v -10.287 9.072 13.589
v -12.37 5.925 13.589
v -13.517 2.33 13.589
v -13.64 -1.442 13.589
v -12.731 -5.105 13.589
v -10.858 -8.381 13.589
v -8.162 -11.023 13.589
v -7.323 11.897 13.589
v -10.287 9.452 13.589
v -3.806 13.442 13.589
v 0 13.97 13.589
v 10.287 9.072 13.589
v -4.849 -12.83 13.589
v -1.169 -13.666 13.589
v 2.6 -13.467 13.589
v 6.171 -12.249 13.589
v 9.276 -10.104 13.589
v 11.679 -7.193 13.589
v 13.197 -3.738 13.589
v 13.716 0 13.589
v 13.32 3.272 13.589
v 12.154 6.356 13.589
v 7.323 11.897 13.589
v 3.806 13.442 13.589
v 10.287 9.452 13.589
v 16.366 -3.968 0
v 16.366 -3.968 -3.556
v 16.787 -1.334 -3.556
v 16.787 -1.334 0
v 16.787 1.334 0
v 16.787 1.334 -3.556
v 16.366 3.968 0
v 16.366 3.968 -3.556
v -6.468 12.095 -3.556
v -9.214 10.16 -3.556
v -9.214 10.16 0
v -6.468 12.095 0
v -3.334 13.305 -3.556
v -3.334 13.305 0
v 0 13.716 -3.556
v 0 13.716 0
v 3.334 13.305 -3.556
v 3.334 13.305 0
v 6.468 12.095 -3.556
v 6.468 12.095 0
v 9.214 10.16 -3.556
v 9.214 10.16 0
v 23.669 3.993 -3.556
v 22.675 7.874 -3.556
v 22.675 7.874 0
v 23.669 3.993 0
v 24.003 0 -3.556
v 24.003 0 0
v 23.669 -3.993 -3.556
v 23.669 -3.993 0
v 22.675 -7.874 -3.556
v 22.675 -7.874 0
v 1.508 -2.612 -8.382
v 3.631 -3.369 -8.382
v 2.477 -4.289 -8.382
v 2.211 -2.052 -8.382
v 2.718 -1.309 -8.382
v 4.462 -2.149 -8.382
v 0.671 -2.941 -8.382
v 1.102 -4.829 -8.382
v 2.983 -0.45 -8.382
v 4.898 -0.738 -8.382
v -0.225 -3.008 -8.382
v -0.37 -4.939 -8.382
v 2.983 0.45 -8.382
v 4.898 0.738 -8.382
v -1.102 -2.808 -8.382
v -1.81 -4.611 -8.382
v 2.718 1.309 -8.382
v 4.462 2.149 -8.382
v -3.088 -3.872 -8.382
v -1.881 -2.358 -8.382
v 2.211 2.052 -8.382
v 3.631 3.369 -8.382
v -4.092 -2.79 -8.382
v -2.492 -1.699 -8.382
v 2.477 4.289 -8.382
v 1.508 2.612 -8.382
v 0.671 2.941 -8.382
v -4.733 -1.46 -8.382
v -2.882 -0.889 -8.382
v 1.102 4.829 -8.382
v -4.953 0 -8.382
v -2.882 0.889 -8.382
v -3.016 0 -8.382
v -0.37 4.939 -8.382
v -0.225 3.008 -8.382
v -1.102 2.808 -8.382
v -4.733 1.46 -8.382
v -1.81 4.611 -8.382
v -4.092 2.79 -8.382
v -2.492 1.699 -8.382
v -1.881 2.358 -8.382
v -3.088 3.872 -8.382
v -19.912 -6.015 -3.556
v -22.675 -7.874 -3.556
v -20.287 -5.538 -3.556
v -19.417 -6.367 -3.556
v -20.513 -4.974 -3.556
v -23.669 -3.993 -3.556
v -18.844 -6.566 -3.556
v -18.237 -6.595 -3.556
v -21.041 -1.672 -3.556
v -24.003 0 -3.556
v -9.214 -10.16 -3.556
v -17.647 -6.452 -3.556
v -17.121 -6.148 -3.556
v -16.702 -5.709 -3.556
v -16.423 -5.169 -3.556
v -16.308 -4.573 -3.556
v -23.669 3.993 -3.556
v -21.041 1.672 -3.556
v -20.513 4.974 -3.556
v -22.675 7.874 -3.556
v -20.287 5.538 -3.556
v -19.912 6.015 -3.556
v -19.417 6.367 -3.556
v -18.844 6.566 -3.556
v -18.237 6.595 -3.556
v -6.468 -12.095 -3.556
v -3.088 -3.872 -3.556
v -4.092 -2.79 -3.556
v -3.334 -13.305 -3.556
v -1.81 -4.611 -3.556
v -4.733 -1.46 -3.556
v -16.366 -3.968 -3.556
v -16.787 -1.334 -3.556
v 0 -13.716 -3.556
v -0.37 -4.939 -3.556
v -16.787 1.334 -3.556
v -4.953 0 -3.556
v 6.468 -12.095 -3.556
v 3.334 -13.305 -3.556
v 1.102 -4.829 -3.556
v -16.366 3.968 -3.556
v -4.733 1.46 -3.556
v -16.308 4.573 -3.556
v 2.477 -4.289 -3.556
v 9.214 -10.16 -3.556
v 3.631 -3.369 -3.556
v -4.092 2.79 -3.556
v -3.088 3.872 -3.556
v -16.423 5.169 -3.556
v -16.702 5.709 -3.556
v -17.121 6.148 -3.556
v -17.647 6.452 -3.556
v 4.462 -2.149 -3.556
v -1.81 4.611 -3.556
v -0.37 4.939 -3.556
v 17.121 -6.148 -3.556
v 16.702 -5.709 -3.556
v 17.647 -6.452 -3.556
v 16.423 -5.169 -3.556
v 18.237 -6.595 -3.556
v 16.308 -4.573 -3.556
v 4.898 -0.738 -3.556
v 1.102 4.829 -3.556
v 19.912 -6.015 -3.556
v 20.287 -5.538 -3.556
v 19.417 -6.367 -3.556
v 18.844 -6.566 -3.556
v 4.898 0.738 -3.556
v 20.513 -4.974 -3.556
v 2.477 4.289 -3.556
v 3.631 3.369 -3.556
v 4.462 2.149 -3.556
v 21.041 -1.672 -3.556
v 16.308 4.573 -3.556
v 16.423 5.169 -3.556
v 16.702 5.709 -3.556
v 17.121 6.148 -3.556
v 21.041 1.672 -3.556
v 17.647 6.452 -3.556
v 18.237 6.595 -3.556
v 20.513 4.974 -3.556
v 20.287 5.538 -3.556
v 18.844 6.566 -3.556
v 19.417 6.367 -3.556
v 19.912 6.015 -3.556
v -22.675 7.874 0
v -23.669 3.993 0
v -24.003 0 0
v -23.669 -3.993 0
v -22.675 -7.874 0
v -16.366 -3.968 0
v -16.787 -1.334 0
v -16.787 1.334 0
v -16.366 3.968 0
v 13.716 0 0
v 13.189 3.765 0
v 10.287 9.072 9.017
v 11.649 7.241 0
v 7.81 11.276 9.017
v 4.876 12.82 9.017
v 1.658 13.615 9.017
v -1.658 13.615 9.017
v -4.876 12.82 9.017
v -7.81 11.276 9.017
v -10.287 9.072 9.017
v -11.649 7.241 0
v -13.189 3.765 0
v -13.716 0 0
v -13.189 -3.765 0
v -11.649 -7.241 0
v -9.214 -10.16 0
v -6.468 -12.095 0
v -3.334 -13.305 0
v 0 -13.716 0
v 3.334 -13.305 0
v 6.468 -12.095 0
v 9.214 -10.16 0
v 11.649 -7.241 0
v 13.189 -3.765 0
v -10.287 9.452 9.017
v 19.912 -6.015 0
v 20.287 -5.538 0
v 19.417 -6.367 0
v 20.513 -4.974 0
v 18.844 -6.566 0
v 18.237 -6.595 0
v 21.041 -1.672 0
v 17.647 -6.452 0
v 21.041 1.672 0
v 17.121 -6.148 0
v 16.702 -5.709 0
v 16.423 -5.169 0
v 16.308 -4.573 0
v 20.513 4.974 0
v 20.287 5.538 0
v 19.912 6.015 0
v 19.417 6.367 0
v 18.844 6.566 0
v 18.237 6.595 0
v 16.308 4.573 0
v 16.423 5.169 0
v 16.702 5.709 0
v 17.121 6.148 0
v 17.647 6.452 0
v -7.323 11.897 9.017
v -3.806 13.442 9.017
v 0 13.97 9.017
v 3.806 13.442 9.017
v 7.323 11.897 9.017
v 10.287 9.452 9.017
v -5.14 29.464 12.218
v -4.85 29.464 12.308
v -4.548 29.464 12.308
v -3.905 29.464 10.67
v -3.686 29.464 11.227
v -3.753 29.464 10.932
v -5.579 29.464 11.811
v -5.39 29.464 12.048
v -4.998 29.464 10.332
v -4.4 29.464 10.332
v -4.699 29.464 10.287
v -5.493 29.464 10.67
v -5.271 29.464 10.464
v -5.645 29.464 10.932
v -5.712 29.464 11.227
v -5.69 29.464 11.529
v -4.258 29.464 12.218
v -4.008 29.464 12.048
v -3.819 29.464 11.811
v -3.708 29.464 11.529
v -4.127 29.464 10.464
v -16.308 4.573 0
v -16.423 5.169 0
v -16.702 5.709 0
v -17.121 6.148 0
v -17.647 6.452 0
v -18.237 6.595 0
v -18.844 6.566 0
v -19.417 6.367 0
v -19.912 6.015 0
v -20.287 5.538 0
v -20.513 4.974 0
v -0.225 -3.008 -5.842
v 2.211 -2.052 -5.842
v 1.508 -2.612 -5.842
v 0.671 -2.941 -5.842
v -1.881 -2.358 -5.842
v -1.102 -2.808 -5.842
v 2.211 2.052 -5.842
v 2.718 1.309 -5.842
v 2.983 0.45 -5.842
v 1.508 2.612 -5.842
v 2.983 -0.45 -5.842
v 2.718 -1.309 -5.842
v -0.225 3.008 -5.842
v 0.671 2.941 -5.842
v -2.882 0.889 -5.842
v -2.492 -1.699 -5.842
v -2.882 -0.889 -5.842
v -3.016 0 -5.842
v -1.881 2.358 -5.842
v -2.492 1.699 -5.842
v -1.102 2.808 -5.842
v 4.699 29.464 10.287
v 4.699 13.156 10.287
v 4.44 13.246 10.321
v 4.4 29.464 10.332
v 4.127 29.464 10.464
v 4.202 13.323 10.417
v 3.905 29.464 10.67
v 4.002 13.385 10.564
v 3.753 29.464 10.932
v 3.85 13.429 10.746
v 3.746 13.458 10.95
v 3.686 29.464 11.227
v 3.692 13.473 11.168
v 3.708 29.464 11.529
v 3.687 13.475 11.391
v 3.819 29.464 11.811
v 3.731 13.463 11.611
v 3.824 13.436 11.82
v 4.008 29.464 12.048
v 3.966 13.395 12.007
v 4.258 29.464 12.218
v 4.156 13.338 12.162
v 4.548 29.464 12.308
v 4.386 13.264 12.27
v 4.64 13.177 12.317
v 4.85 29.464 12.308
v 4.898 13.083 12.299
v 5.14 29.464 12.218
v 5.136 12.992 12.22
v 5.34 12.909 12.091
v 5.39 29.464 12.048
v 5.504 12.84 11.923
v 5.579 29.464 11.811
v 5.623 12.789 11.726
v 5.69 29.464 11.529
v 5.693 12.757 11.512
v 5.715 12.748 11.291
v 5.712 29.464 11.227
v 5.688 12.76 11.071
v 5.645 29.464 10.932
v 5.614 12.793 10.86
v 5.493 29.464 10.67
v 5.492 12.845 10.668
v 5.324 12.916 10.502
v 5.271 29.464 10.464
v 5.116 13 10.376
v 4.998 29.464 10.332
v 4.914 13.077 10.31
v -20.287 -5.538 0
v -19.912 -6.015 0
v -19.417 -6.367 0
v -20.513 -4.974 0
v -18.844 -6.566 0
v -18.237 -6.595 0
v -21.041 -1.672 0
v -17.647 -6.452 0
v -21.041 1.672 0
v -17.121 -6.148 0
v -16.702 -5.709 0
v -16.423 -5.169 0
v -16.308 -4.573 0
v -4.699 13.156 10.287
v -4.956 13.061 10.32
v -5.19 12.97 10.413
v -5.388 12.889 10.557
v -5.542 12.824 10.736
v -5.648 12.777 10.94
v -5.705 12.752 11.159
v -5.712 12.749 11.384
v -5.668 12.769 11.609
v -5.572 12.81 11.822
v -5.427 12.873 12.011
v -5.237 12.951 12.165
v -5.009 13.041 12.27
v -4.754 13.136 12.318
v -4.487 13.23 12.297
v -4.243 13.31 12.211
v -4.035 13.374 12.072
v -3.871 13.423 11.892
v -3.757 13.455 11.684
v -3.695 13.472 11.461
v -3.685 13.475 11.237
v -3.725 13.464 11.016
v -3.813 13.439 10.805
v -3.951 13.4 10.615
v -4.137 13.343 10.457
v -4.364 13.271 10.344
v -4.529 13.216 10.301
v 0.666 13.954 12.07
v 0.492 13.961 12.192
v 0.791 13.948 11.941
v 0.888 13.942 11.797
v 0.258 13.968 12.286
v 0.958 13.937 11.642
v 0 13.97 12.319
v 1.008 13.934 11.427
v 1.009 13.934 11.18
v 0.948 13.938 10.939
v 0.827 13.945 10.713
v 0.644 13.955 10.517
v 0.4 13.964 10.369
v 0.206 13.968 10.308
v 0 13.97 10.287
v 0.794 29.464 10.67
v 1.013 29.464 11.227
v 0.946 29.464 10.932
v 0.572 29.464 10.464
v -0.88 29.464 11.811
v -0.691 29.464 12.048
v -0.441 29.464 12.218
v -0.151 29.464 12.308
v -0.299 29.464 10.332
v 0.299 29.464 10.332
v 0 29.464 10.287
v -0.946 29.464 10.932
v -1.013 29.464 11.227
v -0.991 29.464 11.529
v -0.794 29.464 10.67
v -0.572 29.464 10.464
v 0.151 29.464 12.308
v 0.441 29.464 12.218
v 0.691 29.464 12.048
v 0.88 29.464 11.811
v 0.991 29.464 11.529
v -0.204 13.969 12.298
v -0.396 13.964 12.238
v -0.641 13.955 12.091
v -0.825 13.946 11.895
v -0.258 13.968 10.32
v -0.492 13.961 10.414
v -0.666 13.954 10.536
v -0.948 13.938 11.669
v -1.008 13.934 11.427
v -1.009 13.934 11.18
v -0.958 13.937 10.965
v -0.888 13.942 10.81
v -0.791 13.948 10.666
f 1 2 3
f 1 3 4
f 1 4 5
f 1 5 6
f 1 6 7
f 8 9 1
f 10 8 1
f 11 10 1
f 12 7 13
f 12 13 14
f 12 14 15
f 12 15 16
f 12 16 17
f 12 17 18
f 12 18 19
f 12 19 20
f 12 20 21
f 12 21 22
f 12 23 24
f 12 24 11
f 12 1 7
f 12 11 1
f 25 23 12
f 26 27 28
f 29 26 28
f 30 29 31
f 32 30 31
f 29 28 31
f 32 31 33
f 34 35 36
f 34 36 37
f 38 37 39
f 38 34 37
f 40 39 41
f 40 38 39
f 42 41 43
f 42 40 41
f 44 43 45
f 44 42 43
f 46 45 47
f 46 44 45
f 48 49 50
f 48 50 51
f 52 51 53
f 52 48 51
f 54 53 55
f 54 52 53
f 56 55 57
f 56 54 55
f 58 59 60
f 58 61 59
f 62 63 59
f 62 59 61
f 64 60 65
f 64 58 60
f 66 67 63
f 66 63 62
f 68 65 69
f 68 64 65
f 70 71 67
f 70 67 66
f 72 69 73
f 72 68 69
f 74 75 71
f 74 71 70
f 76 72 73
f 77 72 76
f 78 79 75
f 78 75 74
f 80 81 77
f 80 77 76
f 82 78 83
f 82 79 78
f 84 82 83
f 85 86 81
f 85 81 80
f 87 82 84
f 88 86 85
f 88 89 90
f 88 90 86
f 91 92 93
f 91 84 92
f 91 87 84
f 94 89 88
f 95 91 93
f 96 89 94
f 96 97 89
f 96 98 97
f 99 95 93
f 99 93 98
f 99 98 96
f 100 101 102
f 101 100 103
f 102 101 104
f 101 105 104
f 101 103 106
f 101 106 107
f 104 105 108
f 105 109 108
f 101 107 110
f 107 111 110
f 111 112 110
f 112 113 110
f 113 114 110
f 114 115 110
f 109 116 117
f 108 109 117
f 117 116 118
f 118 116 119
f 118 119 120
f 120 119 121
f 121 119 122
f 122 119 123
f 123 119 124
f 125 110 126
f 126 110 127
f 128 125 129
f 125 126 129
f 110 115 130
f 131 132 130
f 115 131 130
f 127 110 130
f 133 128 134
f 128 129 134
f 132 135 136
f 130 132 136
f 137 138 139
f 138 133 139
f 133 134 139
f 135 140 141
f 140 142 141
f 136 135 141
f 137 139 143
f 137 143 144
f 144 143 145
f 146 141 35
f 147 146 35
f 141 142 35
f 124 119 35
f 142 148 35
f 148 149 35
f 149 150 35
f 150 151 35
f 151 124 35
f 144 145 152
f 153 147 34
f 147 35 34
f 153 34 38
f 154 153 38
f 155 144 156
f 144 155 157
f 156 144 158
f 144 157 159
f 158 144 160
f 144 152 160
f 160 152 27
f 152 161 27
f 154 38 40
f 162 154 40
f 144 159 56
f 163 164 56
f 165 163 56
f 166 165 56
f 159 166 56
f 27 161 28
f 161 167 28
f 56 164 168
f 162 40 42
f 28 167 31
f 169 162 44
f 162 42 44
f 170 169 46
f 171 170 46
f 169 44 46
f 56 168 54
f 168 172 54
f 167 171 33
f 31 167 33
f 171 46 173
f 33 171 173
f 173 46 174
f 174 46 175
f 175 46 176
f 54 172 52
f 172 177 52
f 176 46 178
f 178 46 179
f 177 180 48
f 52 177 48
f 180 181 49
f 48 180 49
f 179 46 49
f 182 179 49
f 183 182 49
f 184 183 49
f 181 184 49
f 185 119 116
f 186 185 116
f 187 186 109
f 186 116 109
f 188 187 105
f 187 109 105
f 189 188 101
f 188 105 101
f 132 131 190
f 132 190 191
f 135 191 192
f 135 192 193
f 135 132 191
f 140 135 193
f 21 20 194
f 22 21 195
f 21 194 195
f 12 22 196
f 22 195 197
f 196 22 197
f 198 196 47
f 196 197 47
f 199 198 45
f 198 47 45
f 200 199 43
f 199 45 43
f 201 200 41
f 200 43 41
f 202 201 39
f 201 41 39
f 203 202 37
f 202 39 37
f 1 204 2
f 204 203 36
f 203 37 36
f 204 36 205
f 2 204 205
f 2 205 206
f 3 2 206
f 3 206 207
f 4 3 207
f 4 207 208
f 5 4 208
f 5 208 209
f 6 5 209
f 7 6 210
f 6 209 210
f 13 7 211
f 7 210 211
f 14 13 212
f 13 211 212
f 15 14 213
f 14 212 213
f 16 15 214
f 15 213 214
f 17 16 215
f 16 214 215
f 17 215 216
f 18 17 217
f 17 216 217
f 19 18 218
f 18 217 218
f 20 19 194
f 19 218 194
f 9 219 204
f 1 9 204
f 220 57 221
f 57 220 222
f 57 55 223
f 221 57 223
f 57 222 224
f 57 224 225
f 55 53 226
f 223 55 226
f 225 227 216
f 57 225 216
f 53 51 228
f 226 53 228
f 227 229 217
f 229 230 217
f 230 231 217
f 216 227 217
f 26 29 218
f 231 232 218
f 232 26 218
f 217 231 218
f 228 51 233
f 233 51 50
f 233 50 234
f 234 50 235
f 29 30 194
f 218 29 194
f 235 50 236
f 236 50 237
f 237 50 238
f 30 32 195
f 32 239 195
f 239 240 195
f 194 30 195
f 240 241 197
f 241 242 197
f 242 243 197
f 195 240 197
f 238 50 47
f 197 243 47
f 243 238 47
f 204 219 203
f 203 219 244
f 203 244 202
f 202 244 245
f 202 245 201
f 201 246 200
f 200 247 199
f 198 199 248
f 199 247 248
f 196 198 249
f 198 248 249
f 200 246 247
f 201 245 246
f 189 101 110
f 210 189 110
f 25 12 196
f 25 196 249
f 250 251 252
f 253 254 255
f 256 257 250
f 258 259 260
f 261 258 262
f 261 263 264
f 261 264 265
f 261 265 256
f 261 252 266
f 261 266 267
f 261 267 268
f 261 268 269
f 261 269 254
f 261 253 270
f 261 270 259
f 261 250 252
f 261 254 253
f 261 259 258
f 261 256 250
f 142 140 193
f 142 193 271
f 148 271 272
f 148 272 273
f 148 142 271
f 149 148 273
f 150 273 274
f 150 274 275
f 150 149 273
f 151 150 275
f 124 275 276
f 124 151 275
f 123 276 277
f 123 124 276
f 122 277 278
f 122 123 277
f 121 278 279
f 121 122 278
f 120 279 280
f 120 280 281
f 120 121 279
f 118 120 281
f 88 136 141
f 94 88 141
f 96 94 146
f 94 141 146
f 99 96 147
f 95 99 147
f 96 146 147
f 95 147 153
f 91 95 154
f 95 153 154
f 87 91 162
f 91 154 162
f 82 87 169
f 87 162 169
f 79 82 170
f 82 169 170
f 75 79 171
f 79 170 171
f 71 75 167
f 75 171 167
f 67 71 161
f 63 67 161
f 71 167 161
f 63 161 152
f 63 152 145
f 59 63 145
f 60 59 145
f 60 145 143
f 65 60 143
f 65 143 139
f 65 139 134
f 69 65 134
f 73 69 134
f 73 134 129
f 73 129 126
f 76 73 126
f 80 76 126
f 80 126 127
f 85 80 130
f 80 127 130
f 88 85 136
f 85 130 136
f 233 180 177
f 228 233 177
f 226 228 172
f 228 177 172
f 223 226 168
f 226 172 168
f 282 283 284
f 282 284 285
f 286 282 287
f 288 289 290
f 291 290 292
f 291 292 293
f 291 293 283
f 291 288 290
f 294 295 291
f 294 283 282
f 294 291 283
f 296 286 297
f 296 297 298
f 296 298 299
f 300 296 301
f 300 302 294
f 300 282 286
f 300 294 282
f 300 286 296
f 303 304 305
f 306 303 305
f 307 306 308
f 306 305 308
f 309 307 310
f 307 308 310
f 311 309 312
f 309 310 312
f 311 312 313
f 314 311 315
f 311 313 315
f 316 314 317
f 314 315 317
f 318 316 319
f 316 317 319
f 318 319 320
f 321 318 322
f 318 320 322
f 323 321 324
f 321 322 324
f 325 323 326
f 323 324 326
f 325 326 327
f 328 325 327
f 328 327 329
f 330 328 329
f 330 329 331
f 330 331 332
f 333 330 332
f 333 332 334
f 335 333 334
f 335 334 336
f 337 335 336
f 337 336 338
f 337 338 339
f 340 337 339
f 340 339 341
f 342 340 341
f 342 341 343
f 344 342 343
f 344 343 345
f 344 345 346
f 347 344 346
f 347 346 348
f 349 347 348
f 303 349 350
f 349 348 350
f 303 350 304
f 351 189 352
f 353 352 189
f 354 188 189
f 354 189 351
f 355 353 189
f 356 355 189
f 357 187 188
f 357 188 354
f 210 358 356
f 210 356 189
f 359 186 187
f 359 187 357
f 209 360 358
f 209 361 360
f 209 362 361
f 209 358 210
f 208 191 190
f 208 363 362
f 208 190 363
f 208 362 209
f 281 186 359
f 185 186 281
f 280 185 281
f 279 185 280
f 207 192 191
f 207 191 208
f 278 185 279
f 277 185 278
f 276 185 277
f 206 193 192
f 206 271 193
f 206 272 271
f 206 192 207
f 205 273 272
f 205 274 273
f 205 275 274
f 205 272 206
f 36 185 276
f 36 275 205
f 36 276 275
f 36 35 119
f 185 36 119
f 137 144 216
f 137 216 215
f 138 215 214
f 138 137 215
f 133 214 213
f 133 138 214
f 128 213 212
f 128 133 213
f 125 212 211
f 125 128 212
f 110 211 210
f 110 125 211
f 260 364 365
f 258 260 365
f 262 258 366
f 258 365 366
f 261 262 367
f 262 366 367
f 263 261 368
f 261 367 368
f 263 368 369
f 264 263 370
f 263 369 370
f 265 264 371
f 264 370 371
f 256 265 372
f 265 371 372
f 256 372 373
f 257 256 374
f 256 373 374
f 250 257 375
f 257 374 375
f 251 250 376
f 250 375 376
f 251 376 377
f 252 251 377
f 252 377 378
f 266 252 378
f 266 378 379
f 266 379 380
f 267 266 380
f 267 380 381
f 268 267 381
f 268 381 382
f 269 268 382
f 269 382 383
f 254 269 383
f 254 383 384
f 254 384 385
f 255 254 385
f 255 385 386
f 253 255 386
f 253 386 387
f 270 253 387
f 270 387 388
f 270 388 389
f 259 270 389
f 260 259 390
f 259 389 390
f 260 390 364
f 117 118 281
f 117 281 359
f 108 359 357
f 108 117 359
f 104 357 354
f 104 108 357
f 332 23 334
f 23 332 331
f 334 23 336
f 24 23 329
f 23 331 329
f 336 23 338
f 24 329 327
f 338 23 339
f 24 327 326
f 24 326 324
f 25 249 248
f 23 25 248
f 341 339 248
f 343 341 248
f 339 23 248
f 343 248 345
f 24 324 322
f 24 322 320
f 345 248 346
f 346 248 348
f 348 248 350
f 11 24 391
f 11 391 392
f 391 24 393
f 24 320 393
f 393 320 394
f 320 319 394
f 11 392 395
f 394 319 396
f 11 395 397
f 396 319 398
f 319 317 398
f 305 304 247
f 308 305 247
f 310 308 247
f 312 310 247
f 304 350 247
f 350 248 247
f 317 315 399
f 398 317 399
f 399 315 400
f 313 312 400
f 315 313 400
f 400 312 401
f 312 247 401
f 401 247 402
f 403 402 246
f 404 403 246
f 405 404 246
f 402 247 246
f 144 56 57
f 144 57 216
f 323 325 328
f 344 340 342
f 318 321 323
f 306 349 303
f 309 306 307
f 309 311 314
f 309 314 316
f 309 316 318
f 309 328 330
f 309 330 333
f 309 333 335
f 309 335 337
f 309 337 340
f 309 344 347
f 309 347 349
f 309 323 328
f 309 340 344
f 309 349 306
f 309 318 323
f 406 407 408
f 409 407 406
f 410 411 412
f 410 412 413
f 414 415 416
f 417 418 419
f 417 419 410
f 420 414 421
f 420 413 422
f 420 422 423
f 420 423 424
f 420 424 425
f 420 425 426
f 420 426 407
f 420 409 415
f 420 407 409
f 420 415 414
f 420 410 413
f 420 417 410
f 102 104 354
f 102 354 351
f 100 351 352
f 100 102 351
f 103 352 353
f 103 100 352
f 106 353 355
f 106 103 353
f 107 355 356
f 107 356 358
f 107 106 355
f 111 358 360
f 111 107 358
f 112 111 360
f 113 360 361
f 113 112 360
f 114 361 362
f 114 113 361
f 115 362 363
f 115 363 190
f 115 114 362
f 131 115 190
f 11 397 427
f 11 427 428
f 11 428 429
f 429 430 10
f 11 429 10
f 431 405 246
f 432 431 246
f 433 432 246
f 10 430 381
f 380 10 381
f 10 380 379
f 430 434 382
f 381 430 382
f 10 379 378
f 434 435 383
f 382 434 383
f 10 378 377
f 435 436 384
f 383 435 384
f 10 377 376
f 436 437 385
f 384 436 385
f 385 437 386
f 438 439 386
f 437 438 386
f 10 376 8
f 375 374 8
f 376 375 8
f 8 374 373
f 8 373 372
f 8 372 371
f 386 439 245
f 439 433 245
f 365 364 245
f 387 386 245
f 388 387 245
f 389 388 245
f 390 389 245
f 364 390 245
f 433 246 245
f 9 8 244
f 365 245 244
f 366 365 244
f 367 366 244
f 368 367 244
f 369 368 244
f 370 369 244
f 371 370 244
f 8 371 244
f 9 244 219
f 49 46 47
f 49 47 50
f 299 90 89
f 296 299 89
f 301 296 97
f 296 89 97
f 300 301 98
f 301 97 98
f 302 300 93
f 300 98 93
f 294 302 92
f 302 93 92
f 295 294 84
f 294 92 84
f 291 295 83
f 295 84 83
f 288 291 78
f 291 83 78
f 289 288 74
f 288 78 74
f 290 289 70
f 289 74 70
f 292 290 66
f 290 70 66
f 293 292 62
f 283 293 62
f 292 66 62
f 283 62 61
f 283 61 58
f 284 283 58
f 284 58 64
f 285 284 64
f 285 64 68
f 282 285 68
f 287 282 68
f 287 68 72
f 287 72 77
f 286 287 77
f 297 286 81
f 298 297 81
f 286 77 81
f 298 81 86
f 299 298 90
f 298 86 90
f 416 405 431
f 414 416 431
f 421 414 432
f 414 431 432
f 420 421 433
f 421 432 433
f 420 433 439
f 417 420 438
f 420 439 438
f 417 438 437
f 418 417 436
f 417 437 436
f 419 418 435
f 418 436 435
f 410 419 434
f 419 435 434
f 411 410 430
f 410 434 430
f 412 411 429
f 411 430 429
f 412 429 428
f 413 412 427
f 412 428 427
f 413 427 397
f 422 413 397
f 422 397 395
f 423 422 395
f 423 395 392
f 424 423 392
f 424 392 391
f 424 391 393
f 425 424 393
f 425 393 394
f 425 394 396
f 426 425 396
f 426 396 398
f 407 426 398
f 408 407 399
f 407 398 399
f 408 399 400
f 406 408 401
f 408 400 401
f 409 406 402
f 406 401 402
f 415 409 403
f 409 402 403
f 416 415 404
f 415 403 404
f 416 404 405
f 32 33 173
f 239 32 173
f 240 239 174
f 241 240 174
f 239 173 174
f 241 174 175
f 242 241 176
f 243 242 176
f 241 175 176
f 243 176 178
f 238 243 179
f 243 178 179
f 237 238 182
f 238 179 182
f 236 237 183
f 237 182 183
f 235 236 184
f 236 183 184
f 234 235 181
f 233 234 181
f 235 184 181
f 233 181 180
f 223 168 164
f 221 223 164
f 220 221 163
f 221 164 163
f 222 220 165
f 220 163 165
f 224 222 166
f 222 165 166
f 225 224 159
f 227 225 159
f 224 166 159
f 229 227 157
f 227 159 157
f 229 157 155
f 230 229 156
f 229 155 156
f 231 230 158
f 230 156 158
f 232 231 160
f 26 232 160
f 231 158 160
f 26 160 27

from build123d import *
from build123d.topology import SkipClean

# Parameters (mm, degrees)
SKETCH1_R           = 13.716
BOSS_EXTRUDE1_DEPTH = 13.589
BOSS_EXTRUDE2_START = 3.556
BOSS_EXTRUDE2_DEPTH = 3.556
CUT_EXTRUDE1_DEPTH  = 3.556
SKETCH4_R           = 4.953
BOSS_EXTRUDE3_DEPTH = 4.826
SKETCH5_R           = 3.01625
CUT_EXTRUDE2_DEPTH  = 2.54
BOSS_EXTRUDE4_START = -4.572
BOSS_EXTRUDE4_DEPTH = 4.572
SKETCH6_R           = 1.016
BOSS_EXTRUDE5_DEPTH = 29.464


with BuildPart() as part:
    # Sketch1 → Boss-Extrude1 (new body)
    with BuildSketch(Plane.XY):
        Circle(SKETCH1_R)
    extrude(amount=BOSS_EXTRUDE1_DEPTH)

    # Sketch2 → Boss-Extrude2 (add)
    with BuildSketch(Plane(origin=(0, 0, 0), x_dir=(-1, 0, 0), z_dir=(0, 0, -1)).offset(BOSS_EXTRUDE2_START)):
        with BuildLine():
            Line((-9.214285431, 10.16), (-22.674746592, 7.874))
            ThreePointArc((-22.674746592, 7.874), (-24.003, 0), (-22.674746592, -7.874))
            Line((-22.674746592, -7.874), (-9.214285431, -10.16))
            ThreePointArc((-9.214285431, -10.16), (13.716, 0), (-9.214285431, 10.16))
        make_face()
    boss_extrude2 = extrude(amount=-BOSS_EXTRUDE2_DEPTH)

    # Sketch3 → Cut-Extrude1 (cut)
    with BuildSketch(Plane(origin=(0, 0, -3.556), x_dir=(-1, 0, 0), z_dir=(0, 0, -1))):
        with BuildLine():
            ThreePointArc((-16.365965281, -3.96831406), (-16.8402, 6.1e-08), (-16.365965252, 3.968314178))
            ThreePointArc((-16.365965252, 3.968314178), (-17.93670842, 6.544602887), (-20.512997182, 4.973859806))
            ThreePointArc((-20.512997182, 4.973859806), (-21.1074, 4.2e-08), (-20.512997202, -4.973859724))
            ThreePointArc((-20.512997202, -4.973859724), (-17.936708402, -6.544602882), (-16.365965281, -3.96831406))
        make_face()
    cut_extrude1 = extrude(amount=-CUT_EXTRUDE1_DEPTH, mode=Mode.SUBTRACT)

    # Mirror1: Boss-Extrude2, Cut-Extrude1 across plane
    add(boss_extrude2.mirror(Plane(origin=(0, 0, 0), x_dir=(0, 0, 1), z_dir=(1, 0, 0))))
    add(cut_extrude1.mirror(Plane(origin=(0, 0, 0), x_dir=(0, 0, 1), z_dir=(1, 0, 0))), mode=Mode.SUBTRACT)

    # Sketch4 → Boss-Extrude3 (add)
    with BuildSketch(Plane(origin=(0, 0, -3.556), x_dir=(-1, 0, 0), z_dir=(0, 0, -1))):
        Circle(SKETCH4_R)
    extrude(amount=BOSS_EXTRUDE3_DEPTH)

    # Sketch5 → Cut-Extrude2 (cut)
    with BuildSketch(Plane(origin=(0, 0, -8.382), x_dir=(-1, 0, 0), z_dir=(0, 0, -1))):
        Circle(SKETCH5_R)
    extrude(amount=-CUT_EXTRUDE2_DEPTH, mode=Mode.SUBTRACT)

    # Sketch7 → Boss-Extrude4 (add)
    with BuildSketch(Plane.XY.offset(13.589).offset(BOSS_EXTRUDE4_START)):
        with BuildLine():
            Line((0, 5.951559827), (0, 13.716))
            ThreePointArc((0, 13.716), (-5.643281246, 12.501281246), (-10.287, 9.072281246))
            Line((-10.287, 9.072281246), (-10.287, 5.951559827))
            Line((-10.287, 5.951559827), (0, 5.951559827))
        make_face()
        with BuildLine():
            Line((10.287, 5.951559827), (10.287, 9.072281246))
            ThreePointArc((10.287, 9.072281246), (5.643281246, 12.501281246), (0, 13.716))
            Line((0, 13.716), (0, 5.951559827))
            Line((0, 5.951559827), (10.287, 5.951559827))
        make_face()
        with BuildLine():
            Line((0, 13.716), (0, 13.97))
            ThreePointArc((0, 13.97), (-5.617729535, 12.790700328), (-10.287, 9.45190621))
            Line((-10.287, 9.45190621), (-10.287, 9.072281246))
            ThreePointArc((-10.287, 9.072281246), (-5.643281246, 12.501281246), (0, 13.716))
        make_face()
        with BuildLine():
            Line((10.287, 9.072281246), (10.287, 9.45190621))
            ThreePointArc((10.287, 9.45190621), (5.617729535, 12.790700328), (0, 13.97))
            Line((0, 13.97), (0, 13.716))
            ThreePointArc((0, 13.716), (5.643281246, 12.501281246), (10.287, 9.072281246))
        make_face()
    extrude(amount=BOSS_EXTRUDE4_DEPTH)

    # Sketch6 → Boss-Extrude5 (add)
    with SkipClean():  # the faces are left unmerged after this step: merging them gives an invalid solid
        with BuildSketch(Plane(origin=(0, 0, 0), x_dir=(1, 0, 0), z_dir=(0, 1, 0))):
            with Locations(Location((0, -11.303, 0), (0, 0, 90))):
                Circle(SKETCH6_R)
            with Locations(Location((-4.699, -11.303, 0), (0, 0, 90))):
                Circle(SKETCH6_R)
            with Locations(Location((4.699, -11.303, 0), (0, 0, 90))):
                Circle(SKETCH6_R)
        extrude(amount=BOSS_EXTRUDE5_DEPTH)


solid = part.part
